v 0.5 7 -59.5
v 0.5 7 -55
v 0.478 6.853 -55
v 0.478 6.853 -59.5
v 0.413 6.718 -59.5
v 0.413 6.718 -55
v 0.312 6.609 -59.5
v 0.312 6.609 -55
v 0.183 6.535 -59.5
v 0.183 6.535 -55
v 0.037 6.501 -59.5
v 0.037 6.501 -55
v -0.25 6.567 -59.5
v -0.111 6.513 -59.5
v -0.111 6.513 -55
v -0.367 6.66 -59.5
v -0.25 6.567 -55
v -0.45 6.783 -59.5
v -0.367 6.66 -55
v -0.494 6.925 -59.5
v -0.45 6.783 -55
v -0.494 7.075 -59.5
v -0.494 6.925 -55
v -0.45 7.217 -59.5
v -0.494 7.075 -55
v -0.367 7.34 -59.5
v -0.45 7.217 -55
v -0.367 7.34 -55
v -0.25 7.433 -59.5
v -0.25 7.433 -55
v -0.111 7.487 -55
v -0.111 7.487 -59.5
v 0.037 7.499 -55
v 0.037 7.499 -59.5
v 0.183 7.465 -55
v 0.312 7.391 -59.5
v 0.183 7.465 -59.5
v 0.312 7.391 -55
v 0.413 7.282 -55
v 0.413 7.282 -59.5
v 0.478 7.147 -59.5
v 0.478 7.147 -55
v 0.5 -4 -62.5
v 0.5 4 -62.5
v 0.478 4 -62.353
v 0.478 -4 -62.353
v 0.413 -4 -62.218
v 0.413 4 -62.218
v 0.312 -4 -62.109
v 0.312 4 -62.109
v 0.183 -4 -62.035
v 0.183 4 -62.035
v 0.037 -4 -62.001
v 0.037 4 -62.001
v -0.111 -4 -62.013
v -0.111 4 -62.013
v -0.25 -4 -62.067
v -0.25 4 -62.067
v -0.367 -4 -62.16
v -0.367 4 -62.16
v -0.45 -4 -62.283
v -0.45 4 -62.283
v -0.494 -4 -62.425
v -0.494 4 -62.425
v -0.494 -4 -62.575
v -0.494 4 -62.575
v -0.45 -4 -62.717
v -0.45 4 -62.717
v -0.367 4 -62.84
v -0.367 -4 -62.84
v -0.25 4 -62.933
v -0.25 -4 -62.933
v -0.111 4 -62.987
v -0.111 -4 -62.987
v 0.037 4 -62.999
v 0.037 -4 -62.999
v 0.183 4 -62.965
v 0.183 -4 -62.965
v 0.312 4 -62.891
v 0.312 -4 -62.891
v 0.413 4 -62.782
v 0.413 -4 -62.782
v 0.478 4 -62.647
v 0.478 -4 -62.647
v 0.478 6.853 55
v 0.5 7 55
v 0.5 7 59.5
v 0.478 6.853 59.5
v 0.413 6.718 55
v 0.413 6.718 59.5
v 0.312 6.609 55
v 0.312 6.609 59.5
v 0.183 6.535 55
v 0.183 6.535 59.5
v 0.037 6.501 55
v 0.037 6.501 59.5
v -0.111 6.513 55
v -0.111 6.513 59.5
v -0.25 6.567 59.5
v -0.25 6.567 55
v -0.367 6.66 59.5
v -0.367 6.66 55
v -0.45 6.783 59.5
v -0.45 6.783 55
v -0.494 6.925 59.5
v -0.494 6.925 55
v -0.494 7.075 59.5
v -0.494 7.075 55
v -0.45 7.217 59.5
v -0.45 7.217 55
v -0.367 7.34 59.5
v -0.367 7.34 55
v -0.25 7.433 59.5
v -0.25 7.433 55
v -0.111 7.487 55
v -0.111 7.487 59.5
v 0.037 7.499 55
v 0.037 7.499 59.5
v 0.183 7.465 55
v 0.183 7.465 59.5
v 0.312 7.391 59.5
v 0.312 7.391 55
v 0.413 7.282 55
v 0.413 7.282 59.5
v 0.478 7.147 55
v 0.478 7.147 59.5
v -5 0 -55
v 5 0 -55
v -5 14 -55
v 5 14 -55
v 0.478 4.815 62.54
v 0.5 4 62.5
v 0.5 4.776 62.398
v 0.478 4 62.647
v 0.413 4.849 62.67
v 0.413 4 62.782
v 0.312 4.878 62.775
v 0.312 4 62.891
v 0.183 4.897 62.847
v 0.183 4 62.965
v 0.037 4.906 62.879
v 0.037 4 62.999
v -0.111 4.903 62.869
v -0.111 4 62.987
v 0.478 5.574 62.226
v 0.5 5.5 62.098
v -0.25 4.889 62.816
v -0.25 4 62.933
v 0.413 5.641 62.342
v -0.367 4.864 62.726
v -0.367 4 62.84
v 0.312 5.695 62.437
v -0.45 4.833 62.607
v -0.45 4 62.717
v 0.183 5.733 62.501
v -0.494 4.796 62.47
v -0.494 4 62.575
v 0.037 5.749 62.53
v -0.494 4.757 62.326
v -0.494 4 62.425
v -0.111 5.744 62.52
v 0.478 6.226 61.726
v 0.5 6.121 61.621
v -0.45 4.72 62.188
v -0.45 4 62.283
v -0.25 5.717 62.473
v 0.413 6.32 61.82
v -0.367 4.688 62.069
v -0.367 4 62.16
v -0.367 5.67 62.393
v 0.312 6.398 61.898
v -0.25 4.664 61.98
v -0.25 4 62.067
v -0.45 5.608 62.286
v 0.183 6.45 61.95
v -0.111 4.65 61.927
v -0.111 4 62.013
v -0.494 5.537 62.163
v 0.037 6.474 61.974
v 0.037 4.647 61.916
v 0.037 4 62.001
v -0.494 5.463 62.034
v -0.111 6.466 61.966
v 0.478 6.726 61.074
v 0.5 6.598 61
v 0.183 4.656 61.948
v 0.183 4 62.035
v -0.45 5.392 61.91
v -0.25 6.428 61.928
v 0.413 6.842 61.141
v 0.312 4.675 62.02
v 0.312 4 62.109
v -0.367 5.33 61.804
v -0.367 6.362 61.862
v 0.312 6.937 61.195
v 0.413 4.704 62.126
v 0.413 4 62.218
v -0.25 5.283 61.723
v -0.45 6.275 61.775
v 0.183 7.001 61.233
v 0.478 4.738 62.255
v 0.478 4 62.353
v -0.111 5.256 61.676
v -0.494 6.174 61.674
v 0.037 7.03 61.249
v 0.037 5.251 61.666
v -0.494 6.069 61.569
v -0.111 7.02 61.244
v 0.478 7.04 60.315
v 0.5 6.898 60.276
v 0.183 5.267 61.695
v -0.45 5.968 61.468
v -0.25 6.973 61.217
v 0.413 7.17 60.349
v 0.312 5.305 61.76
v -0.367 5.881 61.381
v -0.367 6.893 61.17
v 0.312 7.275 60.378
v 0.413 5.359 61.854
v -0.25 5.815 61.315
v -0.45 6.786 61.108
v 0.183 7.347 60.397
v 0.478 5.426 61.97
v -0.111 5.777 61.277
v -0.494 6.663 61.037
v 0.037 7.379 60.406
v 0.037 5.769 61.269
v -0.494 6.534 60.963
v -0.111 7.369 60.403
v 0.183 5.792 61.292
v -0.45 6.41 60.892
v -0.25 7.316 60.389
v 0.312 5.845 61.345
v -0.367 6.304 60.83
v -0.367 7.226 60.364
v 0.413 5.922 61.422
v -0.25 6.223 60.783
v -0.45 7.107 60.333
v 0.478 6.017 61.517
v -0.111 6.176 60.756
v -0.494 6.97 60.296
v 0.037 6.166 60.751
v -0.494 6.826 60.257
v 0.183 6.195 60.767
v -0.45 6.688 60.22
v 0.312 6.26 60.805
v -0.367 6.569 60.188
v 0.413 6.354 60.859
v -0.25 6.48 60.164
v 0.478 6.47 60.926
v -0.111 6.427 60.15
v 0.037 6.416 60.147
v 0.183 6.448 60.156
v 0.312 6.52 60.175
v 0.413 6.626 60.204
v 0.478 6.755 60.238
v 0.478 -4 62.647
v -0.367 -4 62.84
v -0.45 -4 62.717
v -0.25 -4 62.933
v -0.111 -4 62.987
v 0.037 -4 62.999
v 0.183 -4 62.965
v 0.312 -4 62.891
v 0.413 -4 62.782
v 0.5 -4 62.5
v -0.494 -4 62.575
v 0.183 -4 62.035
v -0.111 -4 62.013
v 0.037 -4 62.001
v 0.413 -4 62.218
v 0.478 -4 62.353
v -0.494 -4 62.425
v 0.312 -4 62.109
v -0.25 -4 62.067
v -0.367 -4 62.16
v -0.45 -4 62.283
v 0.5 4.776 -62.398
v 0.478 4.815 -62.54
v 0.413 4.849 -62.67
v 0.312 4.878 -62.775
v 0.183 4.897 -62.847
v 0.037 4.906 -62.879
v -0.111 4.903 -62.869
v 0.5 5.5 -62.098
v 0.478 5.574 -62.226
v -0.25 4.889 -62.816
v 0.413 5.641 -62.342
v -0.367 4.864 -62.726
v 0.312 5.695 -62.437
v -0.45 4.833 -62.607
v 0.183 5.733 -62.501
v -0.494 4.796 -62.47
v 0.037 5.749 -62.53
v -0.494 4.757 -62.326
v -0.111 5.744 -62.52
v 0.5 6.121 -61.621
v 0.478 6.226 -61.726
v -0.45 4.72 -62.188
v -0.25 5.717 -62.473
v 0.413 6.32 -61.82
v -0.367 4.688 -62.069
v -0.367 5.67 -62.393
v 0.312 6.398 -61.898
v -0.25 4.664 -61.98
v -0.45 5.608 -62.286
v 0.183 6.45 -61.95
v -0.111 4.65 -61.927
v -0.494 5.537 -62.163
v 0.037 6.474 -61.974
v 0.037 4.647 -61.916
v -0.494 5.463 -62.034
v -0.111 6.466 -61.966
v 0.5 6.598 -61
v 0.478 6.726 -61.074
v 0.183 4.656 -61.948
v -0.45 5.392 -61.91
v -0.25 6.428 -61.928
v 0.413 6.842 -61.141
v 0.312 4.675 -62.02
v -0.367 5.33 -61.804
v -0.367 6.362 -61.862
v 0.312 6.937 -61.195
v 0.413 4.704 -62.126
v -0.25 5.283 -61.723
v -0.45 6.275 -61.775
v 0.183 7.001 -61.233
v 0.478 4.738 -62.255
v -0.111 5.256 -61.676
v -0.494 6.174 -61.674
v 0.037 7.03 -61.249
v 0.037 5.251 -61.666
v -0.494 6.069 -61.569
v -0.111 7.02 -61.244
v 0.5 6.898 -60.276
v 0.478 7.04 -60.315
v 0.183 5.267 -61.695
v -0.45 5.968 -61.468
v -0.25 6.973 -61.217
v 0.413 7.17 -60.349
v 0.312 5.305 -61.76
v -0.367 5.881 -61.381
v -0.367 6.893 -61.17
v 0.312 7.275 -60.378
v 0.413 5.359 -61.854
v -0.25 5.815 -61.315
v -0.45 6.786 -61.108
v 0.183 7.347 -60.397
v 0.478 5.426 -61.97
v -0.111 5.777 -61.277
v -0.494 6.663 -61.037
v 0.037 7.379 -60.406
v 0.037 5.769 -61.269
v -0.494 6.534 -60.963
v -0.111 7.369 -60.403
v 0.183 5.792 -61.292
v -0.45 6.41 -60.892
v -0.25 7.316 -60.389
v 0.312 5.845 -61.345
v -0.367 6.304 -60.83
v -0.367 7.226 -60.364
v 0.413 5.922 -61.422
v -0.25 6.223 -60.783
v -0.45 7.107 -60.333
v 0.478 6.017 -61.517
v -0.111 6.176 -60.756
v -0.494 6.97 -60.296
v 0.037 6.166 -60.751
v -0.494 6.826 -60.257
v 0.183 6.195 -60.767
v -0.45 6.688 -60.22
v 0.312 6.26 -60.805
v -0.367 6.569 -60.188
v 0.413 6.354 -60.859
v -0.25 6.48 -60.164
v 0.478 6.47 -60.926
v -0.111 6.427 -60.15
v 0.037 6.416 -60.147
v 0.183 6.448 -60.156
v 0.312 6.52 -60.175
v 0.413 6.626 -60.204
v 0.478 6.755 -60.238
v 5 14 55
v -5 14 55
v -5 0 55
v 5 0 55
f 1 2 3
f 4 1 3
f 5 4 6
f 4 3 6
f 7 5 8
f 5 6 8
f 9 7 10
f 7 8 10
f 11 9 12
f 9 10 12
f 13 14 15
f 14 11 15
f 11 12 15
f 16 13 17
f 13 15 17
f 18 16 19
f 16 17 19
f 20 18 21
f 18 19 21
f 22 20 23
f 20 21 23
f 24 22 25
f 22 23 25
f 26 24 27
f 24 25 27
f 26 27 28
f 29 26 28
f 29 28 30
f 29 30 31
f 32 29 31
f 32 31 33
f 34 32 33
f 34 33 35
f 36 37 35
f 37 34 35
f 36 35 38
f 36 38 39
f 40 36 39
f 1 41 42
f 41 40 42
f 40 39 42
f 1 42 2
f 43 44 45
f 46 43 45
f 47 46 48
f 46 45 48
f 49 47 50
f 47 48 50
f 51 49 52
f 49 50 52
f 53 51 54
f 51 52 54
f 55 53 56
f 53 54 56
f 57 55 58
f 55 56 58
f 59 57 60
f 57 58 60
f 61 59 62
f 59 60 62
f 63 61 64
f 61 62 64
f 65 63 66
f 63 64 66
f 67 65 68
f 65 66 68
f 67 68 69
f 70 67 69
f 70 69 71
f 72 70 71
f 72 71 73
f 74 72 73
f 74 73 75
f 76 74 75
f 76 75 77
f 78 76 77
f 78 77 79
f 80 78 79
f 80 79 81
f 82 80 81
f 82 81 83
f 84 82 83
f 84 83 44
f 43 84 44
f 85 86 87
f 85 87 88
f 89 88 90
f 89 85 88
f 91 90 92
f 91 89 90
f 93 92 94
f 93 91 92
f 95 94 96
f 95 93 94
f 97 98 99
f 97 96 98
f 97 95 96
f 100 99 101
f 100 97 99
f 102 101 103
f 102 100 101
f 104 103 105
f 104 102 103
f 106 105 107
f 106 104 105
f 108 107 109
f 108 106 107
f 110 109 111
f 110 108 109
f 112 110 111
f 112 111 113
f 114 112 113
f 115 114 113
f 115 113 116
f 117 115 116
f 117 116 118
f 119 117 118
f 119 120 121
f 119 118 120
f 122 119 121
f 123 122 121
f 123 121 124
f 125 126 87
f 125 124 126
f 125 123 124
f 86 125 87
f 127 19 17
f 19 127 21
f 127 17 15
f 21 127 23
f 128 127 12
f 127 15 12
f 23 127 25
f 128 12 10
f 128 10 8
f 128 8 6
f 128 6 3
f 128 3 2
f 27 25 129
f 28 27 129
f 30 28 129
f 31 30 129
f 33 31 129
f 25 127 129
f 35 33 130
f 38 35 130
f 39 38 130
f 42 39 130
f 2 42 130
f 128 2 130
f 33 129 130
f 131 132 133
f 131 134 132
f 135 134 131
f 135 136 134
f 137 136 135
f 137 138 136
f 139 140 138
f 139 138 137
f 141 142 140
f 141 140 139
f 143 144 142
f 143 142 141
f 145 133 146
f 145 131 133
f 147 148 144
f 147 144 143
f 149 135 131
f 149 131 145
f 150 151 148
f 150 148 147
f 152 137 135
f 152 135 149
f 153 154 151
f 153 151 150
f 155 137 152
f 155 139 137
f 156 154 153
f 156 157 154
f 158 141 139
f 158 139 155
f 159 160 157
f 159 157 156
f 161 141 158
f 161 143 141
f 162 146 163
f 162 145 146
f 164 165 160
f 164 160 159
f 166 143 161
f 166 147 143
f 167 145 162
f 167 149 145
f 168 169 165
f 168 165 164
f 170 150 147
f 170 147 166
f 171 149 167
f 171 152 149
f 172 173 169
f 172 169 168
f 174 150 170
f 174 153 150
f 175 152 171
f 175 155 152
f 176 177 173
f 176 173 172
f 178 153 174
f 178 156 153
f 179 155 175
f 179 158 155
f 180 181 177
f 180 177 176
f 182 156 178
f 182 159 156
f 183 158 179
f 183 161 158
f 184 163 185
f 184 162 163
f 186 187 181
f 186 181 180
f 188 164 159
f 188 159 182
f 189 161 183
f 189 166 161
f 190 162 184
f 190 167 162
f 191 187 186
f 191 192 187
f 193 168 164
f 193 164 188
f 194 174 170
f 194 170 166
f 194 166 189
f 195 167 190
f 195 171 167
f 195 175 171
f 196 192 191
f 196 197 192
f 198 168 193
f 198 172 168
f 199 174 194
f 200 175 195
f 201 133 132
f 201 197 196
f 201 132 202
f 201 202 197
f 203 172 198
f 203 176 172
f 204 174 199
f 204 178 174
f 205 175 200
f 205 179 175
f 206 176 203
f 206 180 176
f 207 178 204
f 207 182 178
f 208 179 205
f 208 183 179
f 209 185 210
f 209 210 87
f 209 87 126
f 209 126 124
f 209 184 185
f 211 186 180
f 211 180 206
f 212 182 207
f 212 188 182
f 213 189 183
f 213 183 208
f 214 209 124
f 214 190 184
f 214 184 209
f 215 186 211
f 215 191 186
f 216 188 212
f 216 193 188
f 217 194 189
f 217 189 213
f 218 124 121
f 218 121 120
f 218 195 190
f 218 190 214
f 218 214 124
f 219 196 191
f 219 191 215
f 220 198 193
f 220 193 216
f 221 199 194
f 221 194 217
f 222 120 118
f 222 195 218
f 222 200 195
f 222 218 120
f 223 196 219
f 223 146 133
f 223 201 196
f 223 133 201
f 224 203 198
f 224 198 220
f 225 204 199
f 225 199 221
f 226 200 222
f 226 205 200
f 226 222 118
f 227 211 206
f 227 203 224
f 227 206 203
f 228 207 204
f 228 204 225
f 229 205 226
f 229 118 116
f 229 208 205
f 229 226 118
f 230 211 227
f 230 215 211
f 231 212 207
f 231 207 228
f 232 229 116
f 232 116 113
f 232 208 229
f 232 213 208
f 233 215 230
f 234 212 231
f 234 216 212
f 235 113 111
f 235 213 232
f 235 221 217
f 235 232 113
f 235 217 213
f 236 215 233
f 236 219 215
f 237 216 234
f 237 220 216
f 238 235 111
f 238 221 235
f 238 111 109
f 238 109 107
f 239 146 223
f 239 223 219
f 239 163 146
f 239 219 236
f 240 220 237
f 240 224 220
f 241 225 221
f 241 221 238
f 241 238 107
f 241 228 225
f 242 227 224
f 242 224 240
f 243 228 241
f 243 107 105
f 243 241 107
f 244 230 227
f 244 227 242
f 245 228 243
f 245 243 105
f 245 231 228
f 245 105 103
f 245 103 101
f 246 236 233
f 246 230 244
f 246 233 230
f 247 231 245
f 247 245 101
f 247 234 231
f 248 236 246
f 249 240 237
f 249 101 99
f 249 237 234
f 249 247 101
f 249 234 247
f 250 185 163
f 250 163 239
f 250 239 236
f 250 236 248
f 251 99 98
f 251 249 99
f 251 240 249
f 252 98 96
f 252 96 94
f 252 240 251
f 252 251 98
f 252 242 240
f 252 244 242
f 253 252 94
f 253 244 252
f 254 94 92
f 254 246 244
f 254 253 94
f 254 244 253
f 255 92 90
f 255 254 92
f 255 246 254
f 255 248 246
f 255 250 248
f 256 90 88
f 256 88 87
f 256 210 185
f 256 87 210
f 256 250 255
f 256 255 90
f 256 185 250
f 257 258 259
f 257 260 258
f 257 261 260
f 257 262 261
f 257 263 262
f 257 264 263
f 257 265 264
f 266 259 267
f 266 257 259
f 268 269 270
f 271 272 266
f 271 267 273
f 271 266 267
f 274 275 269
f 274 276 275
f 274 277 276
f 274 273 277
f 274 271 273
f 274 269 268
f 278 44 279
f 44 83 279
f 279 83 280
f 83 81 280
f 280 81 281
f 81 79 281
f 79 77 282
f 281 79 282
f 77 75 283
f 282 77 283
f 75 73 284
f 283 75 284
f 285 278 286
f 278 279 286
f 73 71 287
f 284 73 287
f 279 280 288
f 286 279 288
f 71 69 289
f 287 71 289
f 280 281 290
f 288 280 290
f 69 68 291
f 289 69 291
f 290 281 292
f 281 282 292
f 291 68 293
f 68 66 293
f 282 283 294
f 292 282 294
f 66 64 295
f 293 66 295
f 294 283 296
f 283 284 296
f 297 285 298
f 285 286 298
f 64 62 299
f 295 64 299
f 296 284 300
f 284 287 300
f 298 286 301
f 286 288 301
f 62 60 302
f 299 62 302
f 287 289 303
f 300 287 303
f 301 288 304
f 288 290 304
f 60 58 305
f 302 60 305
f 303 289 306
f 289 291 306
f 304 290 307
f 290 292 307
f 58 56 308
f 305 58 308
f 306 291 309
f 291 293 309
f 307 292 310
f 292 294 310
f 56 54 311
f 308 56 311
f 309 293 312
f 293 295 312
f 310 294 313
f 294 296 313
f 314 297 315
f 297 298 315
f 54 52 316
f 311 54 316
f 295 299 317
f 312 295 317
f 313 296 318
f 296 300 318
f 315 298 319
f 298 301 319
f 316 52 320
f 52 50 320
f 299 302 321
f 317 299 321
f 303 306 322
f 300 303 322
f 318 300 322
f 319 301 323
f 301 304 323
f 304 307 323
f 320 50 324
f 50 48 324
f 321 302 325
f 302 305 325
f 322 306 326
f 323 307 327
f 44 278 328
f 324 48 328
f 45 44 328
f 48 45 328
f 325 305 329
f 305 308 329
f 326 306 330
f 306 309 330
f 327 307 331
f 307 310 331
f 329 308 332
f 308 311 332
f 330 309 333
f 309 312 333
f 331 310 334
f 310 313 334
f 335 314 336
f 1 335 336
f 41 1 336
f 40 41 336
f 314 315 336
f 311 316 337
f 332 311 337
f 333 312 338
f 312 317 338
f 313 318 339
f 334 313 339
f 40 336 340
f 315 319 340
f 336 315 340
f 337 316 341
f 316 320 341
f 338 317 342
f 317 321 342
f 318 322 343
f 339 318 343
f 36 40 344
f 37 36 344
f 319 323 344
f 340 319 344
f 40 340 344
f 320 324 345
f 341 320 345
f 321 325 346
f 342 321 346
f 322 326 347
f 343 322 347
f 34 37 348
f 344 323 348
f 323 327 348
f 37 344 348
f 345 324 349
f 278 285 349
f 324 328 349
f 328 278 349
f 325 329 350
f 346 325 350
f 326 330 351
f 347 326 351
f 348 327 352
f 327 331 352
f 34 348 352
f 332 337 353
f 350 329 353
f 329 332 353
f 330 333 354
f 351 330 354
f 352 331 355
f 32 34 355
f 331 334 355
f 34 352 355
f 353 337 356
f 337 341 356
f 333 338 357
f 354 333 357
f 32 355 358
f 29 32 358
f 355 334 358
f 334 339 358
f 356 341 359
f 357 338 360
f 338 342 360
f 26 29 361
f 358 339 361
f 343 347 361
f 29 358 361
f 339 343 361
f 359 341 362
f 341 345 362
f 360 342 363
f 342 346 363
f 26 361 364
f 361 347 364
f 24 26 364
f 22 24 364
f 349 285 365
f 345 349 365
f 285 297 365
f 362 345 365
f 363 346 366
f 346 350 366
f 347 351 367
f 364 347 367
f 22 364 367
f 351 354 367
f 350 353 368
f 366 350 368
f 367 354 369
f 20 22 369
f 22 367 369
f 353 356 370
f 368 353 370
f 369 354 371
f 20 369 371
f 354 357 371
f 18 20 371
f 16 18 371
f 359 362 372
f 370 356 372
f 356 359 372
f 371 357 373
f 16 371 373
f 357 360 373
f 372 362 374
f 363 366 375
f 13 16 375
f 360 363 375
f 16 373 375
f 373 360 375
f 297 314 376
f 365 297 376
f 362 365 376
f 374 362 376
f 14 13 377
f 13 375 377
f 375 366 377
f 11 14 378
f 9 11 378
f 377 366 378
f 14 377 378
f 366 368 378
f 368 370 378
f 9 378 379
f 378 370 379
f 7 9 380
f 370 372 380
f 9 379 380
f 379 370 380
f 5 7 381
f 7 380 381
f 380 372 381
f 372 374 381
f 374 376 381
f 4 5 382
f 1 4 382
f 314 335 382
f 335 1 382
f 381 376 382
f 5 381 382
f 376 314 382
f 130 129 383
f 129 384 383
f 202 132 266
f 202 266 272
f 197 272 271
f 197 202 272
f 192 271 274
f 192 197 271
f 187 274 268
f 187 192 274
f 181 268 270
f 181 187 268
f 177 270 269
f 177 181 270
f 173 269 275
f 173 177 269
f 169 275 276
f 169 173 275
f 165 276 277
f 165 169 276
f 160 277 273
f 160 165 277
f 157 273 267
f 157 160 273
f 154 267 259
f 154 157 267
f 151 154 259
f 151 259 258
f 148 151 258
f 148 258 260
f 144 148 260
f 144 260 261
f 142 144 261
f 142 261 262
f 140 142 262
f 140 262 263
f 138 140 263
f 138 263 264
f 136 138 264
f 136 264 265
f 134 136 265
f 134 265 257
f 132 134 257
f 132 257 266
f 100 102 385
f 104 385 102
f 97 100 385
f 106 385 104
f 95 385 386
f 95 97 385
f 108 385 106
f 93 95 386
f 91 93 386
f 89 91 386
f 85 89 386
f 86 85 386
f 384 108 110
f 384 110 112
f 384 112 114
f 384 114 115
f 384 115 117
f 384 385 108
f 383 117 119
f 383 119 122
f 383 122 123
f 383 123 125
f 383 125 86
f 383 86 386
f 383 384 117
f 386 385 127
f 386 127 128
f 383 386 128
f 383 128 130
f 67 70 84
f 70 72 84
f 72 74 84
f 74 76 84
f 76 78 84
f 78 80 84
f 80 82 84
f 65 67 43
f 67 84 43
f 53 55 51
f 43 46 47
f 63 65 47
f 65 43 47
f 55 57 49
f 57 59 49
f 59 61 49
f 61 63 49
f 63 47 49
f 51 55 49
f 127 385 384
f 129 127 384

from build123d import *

# Parameters (mm, degrees)
SKETCH_1_W      = 10
SKETCH_1_H      = 14
EXTRUDE_1_DEPTH = 55
SKETCH_3_R      = 0.5


with BuildPart() as part:
    # Эскиз1 → Бобышка-Вытянуть1 (new, symmetric)
    with BuildSketch(Plane.XY):
        with Locations((0, 7)):
            Rectangle(SKETCH_1_W, SKETCH_1_H)
    extrude(amount=EXTRUDE_1_DEPTH, both=True)

    # По траектории1: sweep along a path in Эскиз4
    with BuildLine(Plane(origin=(0, 0, 0), x_dir=(0, 0, -1), z_dir=(1, 0, 0))) as sweep_1_path:
        Line((-62.5, -4), (-62.5, 4))
        ThreePointArc((-62.5, 4), (-61.621320344, 6.121320344), (-59.5, 7))
        Line((-59.5, 7), (-55, 7))
    # Эскиз3 → По траектории1 (sweep)
    with BuildSketch(Plane.XY.offset(55)):
        with Locations((0, 7)):
            Circle(SKETCH_3_R)
    sweep_1 = sweep(path=sweep_1_path.line)

    # Зеркальное отражение1: По траектории1 across plane
    add(sweep_1.mirror(Plane.XY))


solid = part.part
